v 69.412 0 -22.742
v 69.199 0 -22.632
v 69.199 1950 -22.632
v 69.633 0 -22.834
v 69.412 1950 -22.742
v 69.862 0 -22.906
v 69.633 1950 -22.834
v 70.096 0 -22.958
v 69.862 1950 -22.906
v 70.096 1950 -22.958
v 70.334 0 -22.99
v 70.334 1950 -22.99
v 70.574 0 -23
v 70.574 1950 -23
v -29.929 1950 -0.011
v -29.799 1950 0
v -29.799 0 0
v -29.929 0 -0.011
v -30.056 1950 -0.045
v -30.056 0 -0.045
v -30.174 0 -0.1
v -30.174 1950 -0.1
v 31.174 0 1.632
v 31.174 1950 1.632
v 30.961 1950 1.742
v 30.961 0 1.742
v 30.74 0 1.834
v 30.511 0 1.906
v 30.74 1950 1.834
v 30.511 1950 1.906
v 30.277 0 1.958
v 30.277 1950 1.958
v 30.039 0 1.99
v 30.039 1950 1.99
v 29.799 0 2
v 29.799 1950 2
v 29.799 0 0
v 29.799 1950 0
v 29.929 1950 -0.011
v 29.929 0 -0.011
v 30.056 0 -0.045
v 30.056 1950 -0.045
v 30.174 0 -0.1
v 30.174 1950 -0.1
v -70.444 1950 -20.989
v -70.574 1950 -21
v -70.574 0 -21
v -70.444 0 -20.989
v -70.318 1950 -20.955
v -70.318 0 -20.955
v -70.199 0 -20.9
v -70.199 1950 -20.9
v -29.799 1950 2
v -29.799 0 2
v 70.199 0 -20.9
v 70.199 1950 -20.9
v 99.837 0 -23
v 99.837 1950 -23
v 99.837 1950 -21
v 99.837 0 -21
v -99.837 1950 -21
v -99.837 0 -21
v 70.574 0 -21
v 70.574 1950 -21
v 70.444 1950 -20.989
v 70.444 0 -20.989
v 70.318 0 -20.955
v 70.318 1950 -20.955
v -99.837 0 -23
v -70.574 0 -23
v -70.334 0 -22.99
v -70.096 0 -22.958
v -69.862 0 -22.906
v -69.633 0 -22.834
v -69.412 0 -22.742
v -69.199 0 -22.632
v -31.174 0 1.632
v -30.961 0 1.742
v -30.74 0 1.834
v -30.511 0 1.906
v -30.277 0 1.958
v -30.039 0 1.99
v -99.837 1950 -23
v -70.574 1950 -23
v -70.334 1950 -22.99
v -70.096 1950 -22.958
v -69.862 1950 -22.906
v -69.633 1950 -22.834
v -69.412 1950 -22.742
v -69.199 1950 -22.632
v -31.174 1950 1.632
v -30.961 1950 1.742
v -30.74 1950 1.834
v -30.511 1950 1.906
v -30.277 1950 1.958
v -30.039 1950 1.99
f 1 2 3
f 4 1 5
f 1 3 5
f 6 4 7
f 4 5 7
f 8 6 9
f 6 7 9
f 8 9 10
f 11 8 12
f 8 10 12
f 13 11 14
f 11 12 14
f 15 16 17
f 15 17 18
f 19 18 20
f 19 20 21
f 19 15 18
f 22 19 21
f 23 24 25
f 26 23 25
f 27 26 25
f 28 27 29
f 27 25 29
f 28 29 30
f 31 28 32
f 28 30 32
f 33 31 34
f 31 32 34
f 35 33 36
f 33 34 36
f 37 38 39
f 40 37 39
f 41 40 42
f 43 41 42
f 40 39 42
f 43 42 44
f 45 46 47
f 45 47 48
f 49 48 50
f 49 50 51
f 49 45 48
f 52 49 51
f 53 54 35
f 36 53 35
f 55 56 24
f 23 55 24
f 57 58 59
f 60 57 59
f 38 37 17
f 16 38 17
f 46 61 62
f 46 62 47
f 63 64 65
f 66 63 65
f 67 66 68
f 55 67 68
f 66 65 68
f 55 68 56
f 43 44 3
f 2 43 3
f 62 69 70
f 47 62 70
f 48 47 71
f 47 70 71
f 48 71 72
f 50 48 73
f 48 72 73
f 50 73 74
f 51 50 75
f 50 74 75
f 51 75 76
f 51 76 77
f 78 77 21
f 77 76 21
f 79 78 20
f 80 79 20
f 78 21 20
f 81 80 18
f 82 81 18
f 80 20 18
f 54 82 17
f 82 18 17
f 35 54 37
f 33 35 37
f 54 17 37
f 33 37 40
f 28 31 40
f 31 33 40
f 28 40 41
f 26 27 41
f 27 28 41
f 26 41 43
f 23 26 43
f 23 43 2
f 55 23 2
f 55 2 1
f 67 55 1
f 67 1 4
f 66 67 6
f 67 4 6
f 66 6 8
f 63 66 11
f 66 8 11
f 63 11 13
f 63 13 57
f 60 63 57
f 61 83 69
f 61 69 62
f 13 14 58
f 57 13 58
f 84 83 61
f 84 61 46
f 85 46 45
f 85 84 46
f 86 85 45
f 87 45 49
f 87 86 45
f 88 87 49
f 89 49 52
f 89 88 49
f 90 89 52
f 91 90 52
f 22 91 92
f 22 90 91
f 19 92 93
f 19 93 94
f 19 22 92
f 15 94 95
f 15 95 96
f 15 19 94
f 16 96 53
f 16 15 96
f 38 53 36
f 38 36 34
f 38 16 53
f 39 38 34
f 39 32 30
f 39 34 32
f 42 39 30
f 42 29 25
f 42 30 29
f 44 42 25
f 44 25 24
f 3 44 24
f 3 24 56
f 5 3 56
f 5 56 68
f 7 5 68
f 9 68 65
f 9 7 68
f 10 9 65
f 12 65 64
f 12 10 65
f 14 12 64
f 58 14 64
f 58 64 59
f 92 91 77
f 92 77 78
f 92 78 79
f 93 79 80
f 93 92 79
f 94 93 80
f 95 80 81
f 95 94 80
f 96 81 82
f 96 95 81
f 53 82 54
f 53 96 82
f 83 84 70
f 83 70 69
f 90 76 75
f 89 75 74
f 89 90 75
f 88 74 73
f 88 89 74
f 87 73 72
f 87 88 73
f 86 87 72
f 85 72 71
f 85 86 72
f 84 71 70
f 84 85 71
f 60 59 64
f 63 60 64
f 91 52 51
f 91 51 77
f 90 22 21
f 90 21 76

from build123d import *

# Parameters (mm, degrees)
SM_BASE_FLANGE_1_DEPTH = 975


# Sheet-metal steps are written as plain solids
with BuildPart() as part:
    # Sketch 1 → Базовая кромка1 (new body)
    with BuildSketch(Plane(origin=(0, 0, 0), x_dir=(1, 0, 0), z_dir=(0, 1, 0))):
        with BuildLine():
            Line((0, 0), (29.799038106, 0))
            ThreePointArc((29.799038106, 0), (29.99315239, 0.02555563), (30.174038106, 0.100480947))
            Line((30.174038106, 0.100480947), (69.199028853, 22.63156986))
            ThreePointArc((69.199028853, 22.63156986), (69.862276479, 22.906296022), (70.574028853, 23))
            Line((70.574028853, 23), (99.837168574, 23))
            Line((99.837168574, 23), (99.837168574, 21))
            Line((99.837168574, 21), (70.574028853, 21))
            ThreePointArc((70.574028853, 21), (70.379914569, 20.97444437), (70.199028853, 20.899519053))
            Line((70.199028853, 20.899519053), (31.174038106, -1.63156986))
            ThreePointArc((31.174038106, -1.63156986), (30.51079048, -1.906296022), (29.799038106, -2))
            Line((29.799038106, -2), (0, -2))
            Line((0, -2), (0, 0))
        make_face()
    extrude(amount=SM_BASE_FLANGE_1_DEPTH)

    # Зеркальное отражение1: part across plane


with BuildPart() as part_1:
    add(part.part)
    add(part.part.mirror(Plane(origin=(0, 1077.919678531, 2), x_dir=(0, 0, 1), z_dir=(-1, 0, 0))))

    # Зеркальное отражение2: part across plane


with BuildPart() as part_2:
    add(part_1.part)
    add(part_1.part.mirror(Plane(origin=(31, 975, 1.732050808), x_dir=(0, 0, 1), z_dir=(0, 1, 0))))


solid = part_2.part
